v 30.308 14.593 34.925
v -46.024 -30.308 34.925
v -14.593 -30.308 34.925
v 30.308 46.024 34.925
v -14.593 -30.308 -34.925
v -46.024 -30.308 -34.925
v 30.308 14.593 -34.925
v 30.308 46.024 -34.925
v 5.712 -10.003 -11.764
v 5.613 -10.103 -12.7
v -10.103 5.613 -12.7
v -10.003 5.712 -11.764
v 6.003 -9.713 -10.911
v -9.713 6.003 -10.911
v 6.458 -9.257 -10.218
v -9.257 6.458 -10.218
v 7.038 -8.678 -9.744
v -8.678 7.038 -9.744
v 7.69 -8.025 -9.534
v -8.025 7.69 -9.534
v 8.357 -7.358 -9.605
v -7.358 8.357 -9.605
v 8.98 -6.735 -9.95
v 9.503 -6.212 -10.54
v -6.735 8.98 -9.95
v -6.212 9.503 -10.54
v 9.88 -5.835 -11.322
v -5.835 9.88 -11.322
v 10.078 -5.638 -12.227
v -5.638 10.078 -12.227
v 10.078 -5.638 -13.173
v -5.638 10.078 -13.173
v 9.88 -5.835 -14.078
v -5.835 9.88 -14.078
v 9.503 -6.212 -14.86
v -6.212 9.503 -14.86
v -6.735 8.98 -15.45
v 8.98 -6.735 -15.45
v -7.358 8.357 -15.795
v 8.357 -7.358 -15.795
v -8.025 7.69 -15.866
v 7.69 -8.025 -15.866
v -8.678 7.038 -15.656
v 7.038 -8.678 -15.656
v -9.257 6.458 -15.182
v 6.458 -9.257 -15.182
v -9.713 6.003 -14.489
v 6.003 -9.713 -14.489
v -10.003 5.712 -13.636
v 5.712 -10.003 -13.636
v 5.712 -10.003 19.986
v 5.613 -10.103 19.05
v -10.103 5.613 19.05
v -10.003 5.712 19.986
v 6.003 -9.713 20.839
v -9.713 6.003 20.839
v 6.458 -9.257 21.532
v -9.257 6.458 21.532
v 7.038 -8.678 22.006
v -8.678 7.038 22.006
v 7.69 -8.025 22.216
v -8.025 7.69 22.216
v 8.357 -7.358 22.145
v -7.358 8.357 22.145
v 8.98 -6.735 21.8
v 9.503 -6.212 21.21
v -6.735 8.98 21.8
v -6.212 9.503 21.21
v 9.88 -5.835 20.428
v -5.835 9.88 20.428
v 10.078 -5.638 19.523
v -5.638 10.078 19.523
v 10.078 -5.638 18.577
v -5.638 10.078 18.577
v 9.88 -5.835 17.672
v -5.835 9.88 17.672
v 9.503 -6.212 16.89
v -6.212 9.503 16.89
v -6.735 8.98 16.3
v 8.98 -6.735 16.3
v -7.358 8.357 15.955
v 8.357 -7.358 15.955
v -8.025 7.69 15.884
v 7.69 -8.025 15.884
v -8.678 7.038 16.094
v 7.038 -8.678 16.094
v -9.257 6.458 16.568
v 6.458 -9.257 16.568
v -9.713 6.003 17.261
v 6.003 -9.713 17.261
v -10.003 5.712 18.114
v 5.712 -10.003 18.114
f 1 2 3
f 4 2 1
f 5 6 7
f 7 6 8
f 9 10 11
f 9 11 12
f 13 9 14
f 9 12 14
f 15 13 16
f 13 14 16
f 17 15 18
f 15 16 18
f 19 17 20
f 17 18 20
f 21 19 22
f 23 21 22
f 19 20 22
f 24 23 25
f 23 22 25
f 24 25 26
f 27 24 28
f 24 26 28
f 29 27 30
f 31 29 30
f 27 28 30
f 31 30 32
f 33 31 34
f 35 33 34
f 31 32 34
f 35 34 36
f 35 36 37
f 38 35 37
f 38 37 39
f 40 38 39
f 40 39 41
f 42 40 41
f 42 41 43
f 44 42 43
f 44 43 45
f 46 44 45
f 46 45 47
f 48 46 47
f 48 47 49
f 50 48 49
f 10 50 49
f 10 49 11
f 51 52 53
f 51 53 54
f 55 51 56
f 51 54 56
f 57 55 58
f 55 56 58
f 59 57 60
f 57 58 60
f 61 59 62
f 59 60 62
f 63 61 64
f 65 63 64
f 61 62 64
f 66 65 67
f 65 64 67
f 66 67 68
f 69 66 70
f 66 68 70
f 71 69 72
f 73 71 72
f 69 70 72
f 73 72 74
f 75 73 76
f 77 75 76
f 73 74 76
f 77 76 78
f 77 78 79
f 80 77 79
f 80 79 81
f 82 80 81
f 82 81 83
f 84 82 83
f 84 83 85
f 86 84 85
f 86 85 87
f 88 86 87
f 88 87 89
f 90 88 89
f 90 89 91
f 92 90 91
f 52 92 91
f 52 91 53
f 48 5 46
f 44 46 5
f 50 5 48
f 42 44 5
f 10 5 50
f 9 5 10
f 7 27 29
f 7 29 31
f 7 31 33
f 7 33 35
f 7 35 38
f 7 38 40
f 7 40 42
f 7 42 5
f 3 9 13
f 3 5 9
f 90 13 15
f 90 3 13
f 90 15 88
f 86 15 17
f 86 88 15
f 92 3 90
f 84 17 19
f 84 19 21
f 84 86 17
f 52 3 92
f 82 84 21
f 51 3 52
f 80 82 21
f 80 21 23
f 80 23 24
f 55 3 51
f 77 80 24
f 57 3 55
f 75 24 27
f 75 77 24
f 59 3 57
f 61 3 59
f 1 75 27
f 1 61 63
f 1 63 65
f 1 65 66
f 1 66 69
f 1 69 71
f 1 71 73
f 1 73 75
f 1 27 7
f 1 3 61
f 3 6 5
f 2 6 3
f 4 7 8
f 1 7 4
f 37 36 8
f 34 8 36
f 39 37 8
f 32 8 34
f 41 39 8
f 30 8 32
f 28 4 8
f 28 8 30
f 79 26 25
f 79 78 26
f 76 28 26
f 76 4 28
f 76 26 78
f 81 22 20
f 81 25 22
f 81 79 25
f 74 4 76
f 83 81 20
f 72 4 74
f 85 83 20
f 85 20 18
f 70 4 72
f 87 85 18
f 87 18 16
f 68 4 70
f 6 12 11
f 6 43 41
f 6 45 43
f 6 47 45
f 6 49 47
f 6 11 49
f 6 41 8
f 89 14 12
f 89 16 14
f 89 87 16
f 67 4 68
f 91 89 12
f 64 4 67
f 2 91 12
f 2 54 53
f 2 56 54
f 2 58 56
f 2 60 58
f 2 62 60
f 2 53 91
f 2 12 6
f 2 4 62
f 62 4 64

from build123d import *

# Parameters (mm, degrees)
F1_DEPTH = 34.925
F2_SIZE  = 22.22499
F3_SIZE  = 22.22499
F5_D     = 6.35
F6_D     = 6.35


# Not quite as in the source:
# - a fillet or chamfer is up to 0.001 mm smaller than in the source, because OpenCascade refuses the exact size


with BuildPart() as f1:
    # F0 (on Top) → F1 (new body, symmetric)
    with BuildSketch(Plane.XY):
        Polygon((-46.0238126205, -30.3083644086), (-30.3083644086, -46.0238126205), (46.0238126205, 30.3083644086), (30.3083644086, 46.0238126205), align=None)
    extrude(amount=F1_DEPTH, both=True)

    # F2 (size 22.225 in the source; OpenCascade refuses exactly that, so slightly less here)
    f2_edges = [f1.edges().sort_by_distance(p)[0] for p in [
        (46.023813, 30.308364, 0),
    ]]
    chamfer(f2_edges, length=F2_SIZE)

    # F3 (size 22.225 in the source; OpenCascade refuses exactly that, so slightly less here)
    f3_edges = [f1.edges().sort_by_distance(p)[0] for p in [
        (-30.308364, -46.023813, 0),
    ]]
    chamfer(f3_edges, length=F3_SIZE)

    # F5 (through all)
    with Locations(Plane(origin=(7.8577241059, -7.8577241059, 0), x_dir=(0.7071067812, 0.7071067812, 0), z_dir=(0.7071067812, -0.7071067812, 0))):
        with Locations((0, 19.05)):
            Hole(F5_D / 2)

    # F6 (through all)
    with Locations(Plane(origin=(7.8577241059, -7.8577241059, 0), x_dir=(0.7071067812, 0.7071067812, 0), z_dir=(0.7071067812, -0.7071067812, 0))):
        with Locations((0, -12.7)):
            Hole(F6_D / 2)


solid = f1.part
